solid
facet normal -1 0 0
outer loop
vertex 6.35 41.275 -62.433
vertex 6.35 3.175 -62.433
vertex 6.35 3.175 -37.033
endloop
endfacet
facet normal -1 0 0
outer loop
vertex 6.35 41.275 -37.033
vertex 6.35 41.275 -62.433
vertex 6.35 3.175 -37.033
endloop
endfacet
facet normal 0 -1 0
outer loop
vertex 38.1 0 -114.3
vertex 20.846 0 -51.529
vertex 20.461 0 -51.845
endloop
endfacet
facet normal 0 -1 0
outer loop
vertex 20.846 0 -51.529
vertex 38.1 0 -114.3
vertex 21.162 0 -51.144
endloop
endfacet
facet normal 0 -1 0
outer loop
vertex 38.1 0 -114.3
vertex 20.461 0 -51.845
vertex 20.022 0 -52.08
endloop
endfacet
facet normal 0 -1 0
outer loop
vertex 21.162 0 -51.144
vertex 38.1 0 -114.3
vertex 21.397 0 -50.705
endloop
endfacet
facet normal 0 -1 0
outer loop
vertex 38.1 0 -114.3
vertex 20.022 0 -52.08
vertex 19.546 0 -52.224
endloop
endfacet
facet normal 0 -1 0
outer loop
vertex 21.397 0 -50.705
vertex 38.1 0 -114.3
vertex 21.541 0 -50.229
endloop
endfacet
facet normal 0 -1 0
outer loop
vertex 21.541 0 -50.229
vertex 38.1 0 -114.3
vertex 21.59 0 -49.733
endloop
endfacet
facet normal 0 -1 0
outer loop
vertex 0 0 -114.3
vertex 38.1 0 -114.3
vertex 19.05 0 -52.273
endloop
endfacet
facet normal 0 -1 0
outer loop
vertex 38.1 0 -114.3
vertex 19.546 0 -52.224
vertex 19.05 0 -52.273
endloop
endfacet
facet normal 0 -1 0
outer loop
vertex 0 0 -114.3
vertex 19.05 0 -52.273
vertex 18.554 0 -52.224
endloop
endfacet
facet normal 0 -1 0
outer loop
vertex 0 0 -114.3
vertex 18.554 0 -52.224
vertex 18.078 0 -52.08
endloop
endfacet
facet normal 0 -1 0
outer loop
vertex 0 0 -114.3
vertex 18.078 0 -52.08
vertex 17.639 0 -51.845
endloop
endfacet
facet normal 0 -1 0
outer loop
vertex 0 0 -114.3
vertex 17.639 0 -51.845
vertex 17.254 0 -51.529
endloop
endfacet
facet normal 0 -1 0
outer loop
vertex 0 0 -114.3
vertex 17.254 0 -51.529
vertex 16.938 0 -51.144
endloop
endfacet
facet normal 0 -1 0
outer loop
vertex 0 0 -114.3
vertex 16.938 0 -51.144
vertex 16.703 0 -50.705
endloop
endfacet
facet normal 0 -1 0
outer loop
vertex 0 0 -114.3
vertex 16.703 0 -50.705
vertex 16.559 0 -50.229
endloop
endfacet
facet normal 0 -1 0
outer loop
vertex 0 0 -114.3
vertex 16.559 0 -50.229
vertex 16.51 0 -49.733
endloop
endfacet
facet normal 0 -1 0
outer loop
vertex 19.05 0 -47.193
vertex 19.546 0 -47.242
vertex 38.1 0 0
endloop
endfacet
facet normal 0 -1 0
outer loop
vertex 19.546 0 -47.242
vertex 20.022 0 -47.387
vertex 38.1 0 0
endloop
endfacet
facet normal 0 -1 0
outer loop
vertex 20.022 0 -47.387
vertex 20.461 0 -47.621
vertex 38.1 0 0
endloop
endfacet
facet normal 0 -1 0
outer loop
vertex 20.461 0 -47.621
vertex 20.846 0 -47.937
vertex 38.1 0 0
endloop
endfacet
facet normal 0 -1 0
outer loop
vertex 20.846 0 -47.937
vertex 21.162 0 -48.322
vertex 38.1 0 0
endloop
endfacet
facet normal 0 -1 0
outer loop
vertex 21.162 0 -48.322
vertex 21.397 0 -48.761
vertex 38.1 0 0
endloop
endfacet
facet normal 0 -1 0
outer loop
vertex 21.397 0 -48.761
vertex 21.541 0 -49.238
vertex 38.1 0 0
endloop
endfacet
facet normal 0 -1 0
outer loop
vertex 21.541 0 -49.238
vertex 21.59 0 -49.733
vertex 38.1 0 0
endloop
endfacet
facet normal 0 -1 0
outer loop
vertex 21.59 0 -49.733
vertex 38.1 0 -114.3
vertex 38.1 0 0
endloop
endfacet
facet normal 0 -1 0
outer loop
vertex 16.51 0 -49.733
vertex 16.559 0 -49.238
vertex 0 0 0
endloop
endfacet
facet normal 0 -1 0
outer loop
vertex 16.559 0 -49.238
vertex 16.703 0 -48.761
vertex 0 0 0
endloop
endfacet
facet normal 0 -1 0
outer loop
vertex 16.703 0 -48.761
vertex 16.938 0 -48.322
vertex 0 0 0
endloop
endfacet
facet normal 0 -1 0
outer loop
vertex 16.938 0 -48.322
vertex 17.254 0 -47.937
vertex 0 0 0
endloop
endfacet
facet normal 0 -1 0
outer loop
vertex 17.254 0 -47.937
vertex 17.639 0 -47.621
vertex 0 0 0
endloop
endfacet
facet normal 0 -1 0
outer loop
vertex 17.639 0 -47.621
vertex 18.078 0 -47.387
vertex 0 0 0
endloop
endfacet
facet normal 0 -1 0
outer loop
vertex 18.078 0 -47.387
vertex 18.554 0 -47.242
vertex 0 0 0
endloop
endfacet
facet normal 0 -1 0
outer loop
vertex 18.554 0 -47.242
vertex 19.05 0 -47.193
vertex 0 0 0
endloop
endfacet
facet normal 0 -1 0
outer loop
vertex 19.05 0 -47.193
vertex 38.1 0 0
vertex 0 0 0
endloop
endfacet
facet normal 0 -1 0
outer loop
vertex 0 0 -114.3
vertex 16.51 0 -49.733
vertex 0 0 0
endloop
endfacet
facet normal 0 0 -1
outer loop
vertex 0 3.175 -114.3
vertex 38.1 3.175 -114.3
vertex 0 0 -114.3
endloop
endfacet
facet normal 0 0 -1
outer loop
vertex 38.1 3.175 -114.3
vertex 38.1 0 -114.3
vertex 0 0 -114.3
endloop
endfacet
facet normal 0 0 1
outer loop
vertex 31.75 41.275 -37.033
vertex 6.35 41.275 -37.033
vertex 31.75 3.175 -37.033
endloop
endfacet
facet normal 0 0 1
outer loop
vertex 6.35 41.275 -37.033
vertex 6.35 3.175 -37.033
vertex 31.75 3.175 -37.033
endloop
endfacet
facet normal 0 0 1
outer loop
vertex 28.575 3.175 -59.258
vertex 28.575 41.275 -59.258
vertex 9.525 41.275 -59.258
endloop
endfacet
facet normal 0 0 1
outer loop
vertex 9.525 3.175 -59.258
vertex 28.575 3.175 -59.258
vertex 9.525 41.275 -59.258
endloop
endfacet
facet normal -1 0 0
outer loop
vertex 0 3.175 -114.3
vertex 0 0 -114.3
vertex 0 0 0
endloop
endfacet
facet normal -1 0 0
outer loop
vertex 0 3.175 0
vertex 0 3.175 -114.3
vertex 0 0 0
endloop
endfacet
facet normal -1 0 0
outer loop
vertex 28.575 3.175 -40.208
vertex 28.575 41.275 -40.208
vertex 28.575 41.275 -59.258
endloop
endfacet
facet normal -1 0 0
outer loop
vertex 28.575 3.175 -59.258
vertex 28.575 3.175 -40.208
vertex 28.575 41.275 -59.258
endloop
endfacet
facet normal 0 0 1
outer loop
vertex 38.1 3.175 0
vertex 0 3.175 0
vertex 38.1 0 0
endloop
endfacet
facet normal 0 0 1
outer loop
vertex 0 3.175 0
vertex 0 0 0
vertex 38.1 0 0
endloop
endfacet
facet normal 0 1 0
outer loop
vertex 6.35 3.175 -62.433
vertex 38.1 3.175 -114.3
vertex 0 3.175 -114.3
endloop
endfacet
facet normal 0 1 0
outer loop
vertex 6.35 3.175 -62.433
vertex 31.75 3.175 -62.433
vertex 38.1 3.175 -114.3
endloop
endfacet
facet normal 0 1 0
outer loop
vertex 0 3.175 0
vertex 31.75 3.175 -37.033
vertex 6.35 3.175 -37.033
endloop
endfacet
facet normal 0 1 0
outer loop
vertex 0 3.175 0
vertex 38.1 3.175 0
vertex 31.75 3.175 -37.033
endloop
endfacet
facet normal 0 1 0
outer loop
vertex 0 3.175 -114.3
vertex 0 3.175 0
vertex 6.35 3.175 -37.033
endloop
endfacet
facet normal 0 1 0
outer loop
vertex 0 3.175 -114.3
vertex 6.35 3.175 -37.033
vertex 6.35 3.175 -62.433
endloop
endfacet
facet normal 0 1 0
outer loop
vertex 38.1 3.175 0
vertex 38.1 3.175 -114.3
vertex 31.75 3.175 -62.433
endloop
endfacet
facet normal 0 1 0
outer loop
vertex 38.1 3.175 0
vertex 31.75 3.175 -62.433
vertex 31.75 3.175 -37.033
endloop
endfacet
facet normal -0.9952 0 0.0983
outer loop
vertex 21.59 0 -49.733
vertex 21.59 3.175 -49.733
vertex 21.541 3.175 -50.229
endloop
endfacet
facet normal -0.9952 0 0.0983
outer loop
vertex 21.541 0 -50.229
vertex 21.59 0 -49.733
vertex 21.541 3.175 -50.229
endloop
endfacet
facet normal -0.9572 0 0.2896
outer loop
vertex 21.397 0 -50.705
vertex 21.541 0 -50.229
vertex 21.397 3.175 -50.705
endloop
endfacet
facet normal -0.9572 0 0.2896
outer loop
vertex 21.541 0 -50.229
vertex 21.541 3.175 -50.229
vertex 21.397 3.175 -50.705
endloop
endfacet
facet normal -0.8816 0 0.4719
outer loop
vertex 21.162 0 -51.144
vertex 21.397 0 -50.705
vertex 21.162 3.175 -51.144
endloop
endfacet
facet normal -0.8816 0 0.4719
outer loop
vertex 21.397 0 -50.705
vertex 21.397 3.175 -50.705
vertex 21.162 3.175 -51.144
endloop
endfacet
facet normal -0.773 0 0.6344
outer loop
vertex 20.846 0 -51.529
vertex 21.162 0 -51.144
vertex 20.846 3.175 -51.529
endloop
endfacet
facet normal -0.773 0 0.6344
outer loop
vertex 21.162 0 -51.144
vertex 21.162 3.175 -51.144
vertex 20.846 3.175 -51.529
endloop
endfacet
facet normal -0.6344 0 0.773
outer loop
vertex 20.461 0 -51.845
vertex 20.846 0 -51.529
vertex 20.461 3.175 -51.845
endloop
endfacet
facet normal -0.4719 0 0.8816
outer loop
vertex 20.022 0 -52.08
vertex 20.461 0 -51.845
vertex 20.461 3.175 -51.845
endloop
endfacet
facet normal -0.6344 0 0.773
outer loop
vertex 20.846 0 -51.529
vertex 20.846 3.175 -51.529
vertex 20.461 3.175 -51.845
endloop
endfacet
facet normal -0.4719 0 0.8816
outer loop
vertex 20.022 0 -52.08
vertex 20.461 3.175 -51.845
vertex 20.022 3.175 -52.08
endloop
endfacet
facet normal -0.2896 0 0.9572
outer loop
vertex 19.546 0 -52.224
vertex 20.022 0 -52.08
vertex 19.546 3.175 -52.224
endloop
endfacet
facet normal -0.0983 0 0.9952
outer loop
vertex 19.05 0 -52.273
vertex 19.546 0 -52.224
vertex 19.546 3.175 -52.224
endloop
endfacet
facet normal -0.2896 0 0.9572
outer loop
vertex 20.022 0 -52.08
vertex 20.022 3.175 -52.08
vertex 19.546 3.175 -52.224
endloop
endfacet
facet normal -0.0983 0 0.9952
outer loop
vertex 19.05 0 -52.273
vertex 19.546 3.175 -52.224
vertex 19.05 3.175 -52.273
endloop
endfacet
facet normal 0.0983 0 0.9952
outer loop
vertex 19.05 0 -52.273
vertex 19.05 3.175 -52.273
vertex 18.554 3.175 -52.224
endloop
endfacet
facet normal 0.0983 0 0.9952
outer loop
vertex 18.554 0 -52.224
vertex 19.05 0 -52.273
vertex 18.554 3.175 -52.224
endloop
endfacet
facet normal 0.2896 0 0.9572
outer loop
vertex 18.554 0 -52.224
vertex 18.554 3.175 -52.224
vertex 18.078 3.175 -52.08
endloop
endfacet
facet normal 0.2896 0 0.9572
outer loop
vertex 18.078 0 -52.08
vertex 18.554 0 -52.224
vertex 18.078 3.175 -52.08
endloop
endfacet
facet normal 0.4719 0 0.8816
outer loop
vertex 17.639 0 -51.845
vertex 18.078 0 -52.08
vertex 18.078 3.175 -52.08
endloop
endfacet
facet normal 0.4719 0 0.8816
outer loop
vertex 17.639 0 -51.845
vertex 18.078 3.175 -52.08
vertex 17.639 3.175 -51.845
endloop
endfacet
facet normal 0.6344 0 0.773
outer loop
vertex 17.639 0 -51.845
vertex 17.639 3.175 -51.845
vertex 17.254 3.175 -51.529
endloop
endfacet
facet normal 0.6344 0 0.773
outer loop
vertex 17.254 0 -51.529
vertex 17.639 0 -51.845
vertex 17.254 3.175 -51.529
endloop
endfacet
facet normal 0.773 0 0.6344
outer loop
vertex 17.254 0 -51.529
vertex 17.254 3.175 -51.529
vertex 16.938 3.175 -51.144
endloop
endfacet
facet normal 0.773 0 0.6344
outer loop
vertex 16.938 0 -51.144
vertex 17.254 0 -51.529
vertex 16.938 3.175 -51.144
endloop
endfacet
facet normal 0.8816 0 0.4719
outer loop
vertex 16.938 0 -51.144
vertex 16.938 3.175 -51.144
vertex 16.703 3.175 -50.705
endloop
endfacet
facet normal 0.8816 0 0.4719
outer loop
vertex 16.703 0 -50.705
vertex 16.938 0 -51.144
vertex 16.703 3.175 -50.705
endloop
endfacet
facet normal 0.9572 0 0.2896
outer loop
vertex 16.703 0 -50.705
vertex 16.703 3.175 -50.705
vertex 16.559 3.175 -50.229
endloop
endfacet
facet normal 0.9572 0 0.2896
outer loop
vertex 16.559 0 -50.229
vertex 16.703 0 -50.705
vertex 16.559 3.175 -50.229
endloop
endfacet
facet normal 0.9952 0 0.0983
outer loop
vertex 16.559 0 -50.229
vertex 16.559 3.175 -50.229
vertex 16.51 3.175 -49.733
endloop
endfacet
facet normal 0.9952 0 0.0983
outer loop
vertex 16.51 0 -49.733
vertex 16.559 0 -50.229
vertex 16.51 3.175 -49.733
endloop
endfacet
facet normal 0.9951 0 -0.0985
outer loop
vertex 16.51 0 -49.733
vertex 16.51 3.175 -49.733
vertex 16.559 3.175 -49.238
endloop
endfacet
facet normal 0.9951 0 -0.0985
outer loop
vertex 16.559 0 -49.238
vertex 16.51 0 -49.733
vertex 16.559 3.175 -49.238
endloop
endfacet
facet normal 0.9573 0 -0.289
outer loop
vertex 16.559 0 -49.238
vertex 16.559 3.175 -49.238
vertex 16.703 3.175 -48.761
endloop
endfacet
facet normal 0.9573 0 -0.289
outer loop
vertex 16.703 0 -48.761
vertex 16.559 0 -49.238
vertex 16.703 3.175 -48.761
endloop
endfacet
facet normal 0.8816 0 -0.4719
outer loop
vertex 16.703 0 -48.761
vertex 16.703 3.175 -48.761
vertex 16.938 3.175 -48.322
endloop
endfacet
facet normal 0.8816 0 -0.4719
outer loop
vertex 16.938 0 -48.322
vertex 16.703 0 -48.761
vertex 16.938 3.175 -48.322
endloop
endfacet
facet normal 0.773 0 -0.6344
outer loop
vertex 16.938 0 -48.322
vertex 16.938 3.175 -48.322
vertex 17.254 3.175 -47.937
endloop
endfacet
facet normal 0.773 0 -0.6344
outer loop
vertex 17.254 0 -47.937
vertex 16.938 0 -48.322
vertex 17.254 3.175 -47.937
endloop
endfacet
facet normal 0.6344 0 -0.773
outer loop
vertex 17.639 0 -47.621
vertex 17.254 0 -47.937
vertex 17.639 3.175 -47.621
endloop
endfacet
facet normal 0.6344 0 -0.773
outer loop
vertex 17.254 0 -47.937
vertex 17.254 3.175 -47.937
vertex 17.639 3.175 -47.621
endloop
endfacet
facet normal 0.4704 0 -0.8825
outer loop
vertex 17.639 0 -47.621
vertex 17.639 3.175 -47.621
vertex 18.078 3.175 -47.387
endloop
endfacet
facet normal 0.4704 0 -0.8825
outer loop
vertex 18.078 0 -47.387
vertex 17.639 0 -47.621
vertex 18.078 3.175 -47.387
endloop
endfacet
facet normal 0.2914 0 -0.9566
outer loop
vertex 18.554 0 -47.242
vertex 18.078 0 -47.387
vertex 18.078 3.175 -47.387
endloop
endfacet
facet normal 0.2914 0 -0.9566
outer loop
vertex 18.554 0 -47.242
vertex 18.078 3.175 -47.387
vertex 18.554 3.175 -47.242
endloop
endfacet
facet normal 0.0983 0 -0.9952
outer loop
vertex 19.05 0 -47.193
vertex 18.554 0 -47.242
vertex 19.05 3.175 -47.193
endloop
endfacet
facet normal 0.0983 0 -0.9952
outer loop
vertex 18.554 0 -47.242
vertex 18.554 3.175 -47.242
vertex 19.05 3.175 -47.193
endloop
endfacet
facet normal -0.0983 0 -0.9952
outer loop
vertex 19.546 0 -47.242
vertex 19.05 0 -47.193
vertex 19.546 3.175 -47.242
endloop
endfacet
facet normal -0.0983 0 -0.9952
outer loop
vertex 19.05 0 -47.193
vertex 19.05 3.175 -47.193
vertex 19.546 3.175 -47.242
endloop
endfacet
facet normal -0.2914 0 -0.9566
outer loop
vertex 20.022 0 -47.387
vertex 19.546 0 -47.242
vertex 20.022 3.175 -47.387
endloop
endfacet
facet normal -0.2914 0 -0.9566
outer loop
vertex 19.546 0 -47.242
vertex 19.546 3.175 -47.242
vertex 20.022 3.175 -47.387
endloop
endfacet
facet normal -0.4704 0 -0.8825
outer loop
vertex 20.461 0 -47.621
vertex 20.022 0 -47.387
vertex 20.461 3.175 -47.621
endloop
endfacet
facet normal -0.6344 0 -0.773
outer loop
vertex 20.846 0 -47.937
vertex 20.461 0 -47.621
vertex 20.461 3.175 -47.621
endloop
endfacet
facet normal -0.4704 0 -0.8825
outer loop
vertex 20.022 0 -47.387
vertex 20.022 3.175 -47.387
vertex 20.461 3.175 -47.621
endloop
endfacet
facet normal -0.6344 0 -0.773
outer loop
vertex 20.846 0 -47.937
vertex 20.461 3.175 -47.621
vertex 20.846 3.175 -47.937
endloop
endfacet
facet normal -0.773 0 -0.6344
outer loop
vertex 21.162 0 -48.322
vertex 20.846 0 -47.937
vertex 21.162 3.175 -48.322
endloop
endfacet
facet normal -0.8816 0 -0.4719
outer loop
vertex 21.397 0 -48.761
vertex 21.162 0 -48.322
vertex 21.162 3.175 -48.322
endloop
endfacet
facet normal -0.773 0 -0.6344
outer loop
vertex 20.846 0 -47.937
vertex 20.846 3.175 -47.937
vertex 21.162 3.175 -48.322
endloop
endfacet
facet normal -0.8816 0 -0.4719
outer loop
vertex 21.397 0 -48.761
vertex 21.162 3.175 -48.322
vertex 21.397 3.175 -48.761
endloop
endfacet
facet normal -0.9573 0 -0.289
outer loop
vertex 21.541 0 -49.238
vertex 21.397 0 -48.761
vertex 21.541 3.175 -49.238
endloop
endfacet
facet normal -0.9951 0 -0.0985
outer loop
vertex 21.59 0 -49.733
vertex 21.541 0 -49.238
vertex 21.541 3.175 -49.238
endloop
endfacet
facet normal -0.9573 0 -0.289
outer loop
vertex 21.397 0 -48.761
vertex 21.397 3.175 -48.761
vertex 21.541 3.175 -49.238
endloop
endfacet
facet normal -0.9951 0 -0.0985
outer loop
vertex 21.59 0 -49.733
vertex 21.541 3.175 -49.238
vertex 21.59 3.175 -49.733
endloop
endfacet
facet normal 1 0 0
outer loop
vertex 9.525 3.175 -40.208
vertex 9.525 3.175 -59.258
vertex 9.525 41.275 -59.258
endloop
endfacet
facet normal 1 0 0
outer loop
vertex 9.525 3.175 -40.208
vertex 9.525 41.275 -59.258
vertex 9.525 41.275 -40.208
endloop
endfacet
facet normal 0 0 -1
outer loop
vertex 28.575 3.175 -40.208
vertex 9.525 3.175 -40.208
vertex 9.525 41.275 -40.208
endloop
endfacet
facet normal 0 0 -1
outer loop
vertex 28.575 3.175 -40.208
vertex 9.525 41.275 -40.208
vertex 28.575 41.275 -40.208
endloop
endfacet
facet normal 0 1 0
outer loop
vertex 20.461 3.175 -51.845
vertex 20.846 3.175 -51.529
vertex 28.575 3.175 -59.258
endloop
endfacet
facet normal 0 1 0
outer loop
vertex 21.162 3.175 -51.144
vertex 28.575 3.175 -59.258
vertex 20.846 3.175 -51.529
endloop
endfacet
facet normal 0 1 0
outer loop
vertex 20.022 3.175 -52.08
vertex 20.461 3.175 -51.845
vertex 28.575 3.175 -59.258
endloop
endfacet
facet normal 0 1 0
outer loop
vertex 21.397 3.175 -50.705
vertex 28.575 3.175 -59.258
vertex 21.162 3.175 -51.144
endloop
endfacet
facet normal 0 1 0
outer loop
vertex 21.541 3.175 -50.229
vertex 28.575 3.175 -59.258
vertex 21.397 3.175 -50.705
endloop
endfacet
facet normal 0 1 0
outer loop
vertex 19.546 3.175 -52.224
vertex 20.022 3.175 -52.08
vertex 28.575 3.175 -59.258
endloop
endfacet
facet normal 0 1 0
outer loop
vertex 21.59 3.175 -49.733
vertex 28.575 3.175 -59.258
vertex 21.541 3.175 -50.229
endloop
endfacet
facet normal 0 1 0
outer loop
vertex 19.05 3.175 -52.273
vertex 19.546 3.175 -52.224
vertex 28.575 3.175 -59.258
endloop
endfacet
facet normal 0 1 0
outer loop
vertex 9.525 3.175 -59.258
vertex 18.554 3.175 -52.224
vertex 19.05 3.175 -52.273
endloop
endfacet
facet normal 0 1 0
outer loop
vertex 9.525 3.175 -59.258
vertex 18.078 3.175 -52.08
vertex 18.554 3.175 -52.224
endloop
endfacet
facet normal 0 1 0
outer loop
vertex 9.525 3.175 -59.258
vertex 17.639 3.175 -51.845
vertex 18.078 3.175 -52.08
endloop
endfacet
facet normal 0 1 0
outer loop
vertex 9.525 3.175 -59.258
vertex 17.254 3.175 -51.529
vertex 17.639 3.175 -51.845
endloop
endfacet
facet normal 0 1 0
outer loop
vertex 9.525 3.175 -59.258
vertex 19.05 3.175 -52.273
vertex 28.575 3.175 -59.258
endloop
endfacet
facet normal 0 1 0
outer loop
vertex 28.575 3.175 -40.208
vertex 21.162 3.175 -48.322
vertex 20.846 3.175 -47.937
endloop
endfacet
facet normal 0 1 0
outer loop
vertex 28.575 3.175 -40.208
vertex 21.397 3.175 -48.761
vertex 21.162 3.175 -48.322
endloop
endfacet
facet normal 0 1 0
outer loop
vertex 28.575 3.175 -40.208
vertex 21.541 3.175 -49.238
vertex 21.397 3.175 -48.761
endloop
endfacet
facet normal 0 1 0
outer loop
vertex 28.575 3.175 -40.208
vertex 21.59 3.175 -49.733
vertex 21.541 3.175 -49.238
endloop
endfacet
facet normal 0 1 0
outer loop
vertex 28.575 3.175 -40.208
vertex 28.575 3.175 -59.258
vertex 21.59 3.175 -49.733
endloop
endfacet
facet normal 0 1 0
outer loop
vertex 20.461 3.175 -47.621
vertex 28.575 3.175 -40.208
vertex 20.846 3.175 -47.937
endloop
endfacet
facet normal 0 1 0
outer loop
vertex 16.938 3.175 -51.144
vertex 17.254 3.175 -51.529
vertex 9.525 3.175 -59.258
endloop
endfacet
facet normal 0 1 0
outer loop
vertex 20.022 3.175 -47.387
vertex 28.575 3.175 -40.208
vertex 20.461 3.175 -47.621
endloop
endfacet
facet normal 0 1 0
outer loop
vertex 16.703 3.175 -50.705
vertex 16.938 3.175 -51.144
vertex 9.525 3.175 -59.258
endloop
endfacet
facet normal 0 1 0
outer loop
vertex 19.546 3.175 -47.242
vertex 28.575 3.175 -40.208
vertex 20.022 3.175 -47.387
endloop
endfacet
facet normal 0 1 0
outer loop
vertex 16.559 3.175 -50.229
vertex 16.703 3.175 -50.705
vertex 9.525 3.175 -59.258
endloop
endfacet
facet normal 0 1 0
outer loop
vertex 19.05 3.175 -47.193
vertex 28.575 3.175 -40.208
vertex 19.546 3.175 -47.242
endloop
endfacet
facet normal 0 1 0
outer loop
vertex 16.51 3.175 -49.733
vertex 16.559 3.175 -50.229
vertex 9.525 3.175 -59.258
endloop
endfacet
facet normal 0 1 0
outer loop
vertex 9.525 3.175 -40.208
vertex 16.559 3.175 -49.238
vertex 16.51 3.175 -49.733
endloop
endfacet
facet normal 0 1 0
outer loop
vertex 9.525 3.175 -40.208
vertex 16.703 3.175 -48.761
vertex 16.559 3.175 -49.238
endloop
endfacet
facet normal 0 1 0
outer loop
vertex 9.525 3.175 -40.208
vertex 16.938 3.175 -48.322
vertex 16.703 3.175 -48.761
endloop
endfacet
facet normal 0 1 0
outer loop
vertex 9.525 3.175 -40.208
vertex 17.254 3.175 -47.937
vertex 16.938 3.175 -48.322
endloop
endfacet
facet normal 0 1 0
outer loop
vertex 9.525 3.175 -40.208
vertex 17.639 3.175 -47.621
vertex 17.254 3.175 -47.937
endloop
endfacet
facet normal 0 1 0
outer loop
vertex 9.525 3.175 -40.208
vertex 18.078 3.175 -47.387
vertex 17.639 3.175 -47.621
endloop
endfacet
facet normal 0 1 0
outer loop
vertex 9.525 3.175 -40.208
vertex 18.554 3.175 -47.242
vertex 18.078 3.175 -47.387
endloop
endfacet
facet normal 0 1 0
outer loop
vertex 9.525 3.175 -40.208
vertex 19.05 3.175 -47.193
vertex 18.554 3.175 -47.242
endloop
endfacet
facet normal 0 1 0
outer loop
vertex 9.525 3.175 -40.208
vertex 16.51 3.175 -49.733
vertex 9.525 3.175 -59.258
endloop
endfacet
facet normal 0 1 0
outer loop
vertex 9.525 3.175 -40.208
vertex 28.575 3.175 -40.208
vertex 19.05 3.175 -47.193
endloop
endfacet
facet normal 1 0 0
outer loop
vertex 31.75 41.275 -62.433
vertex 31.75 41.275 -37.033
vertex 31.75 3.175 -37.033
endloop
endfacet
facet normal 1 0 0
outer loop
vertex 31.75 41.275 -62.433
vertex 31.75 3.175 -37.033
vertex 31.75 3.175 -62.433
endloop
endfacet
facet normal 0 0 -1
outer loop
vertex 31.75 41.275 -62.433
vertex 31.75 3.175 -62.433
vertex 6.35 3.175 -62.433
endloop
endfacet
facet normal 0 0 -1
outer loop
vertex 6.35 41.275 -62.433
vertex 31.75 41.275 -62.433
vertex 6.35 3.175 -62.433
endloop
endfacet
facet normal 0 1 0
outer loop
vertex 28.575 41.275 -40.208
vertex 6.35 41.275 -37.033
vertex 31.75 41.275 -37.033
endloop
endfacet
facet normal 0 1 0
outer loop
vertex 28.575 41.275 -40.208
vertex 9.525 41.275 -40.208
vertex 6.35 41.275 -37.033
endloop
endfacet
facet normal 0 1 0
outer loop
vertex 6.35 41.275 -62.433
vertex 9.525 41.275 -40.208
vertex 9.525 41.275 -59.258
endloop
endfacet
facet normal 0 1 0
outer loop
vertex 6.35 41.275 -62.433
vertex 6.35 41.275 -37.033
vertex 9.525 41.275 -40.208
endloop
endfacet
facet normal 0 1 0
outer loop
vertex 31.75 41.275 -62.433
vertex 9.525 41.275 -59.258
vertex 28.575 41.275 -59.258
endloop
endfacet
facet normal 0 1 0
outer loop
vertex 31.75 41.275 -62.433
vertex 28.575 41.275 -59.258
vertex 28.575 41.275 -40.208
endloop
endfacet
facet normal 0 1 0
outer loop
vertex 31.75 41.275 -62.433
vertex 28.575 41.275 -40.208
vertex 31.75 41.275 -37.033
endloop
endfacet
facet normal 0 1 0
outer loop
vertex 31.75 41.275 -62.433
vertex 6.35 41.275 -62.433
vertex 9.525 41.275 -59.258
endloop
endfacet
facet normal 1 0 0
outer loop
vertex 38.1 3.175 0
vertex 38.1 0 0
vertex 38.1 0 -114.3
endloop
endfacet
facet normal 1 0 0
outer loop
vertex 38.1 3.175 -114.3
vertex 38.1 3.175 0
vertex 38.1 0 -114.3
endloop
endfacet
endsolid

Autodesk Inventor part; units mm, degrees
ref_plane "YZ Plane" through (0, 0, 0) normal (1, 0, 0) x (0, 1, 0)
ref_plane "XZ Plane" through (0, 0, 0) normal (0, 1, 0) x (-1, 0, 0)
ref_plane "XY Plane" through (0, 0, 0) normal (0, 0, 1) x (1, 0, 0)
sketch "Sketch1" plane through (0, 0, 0) normal (0, 1, 0) x (-1, 0, 0)
  line L0 (0, 0) -> (-38.1, 0)
  line L1 (-38.1, 0) -> (-38.1, -114.3)
  line L2 (-38.1, -114.3) -> (0, -114.3)
  line L3 (0, -114.3) -> (0, 0)
  dimension "d0" = 38.1
  dimension "d1" = 114.3
extrude "Extrusion1" add sketch "Sketch1" along normal blind 3.175
sketch "Sketch3" plane through (0, 3.175, 0) normal (0, 1, 0) x (1, 0, 0)
  line L0 (31.75, 62.4332) -> (6.35, 62.4332)
  line L1 (6.35, 62.4332) -> (6.35, 37.0332)
  line L2 (6.35, 37.0332) -> (31.75, 37.0332)
  line L3 (31.75, 37.0332) -> (31.75, 62.4332)
  line L4 (38.1, 0) -> (38.1, 114.3) projected
  line L5 (38.1, 114.3) -> (0, 114.3) projected
  line L6 (28.575, 59.2582) -> (9.525, 59.2582)
  line L7 (9.525, 59.2582) -> (9.525, 40.2082)
  line L8 (9.525, 40.2082) -> (28.575, 40.2082)
  line L9 (28.575, 40.2082) -> (28.575, 59.2582)
  circle A0 centre (19.05, 49.7332) radius 2.54
  line L10 (0, 0) -> (38.1, 0) projected
  dimension "d8" = 25.4
  dimension "d9" = 25.4
  dimension "d10" = 6.35
  dimension "d12" = 3.175
  dimension "d15" = 5.08
  dimension "d16" = 12.7
  dimension "d17" = 12.7
  dimension "d23" = 37.0332
extrude "Extrusion3" add sketch "Sketch3" along normal blind 38.1 contours L3 L2 L1 L0
extrude "Extrusion5" cut sketch "Sketch3" against normal blind 3.175 contours A0
properties part number "mounting plate" material "ABS Plastic"
